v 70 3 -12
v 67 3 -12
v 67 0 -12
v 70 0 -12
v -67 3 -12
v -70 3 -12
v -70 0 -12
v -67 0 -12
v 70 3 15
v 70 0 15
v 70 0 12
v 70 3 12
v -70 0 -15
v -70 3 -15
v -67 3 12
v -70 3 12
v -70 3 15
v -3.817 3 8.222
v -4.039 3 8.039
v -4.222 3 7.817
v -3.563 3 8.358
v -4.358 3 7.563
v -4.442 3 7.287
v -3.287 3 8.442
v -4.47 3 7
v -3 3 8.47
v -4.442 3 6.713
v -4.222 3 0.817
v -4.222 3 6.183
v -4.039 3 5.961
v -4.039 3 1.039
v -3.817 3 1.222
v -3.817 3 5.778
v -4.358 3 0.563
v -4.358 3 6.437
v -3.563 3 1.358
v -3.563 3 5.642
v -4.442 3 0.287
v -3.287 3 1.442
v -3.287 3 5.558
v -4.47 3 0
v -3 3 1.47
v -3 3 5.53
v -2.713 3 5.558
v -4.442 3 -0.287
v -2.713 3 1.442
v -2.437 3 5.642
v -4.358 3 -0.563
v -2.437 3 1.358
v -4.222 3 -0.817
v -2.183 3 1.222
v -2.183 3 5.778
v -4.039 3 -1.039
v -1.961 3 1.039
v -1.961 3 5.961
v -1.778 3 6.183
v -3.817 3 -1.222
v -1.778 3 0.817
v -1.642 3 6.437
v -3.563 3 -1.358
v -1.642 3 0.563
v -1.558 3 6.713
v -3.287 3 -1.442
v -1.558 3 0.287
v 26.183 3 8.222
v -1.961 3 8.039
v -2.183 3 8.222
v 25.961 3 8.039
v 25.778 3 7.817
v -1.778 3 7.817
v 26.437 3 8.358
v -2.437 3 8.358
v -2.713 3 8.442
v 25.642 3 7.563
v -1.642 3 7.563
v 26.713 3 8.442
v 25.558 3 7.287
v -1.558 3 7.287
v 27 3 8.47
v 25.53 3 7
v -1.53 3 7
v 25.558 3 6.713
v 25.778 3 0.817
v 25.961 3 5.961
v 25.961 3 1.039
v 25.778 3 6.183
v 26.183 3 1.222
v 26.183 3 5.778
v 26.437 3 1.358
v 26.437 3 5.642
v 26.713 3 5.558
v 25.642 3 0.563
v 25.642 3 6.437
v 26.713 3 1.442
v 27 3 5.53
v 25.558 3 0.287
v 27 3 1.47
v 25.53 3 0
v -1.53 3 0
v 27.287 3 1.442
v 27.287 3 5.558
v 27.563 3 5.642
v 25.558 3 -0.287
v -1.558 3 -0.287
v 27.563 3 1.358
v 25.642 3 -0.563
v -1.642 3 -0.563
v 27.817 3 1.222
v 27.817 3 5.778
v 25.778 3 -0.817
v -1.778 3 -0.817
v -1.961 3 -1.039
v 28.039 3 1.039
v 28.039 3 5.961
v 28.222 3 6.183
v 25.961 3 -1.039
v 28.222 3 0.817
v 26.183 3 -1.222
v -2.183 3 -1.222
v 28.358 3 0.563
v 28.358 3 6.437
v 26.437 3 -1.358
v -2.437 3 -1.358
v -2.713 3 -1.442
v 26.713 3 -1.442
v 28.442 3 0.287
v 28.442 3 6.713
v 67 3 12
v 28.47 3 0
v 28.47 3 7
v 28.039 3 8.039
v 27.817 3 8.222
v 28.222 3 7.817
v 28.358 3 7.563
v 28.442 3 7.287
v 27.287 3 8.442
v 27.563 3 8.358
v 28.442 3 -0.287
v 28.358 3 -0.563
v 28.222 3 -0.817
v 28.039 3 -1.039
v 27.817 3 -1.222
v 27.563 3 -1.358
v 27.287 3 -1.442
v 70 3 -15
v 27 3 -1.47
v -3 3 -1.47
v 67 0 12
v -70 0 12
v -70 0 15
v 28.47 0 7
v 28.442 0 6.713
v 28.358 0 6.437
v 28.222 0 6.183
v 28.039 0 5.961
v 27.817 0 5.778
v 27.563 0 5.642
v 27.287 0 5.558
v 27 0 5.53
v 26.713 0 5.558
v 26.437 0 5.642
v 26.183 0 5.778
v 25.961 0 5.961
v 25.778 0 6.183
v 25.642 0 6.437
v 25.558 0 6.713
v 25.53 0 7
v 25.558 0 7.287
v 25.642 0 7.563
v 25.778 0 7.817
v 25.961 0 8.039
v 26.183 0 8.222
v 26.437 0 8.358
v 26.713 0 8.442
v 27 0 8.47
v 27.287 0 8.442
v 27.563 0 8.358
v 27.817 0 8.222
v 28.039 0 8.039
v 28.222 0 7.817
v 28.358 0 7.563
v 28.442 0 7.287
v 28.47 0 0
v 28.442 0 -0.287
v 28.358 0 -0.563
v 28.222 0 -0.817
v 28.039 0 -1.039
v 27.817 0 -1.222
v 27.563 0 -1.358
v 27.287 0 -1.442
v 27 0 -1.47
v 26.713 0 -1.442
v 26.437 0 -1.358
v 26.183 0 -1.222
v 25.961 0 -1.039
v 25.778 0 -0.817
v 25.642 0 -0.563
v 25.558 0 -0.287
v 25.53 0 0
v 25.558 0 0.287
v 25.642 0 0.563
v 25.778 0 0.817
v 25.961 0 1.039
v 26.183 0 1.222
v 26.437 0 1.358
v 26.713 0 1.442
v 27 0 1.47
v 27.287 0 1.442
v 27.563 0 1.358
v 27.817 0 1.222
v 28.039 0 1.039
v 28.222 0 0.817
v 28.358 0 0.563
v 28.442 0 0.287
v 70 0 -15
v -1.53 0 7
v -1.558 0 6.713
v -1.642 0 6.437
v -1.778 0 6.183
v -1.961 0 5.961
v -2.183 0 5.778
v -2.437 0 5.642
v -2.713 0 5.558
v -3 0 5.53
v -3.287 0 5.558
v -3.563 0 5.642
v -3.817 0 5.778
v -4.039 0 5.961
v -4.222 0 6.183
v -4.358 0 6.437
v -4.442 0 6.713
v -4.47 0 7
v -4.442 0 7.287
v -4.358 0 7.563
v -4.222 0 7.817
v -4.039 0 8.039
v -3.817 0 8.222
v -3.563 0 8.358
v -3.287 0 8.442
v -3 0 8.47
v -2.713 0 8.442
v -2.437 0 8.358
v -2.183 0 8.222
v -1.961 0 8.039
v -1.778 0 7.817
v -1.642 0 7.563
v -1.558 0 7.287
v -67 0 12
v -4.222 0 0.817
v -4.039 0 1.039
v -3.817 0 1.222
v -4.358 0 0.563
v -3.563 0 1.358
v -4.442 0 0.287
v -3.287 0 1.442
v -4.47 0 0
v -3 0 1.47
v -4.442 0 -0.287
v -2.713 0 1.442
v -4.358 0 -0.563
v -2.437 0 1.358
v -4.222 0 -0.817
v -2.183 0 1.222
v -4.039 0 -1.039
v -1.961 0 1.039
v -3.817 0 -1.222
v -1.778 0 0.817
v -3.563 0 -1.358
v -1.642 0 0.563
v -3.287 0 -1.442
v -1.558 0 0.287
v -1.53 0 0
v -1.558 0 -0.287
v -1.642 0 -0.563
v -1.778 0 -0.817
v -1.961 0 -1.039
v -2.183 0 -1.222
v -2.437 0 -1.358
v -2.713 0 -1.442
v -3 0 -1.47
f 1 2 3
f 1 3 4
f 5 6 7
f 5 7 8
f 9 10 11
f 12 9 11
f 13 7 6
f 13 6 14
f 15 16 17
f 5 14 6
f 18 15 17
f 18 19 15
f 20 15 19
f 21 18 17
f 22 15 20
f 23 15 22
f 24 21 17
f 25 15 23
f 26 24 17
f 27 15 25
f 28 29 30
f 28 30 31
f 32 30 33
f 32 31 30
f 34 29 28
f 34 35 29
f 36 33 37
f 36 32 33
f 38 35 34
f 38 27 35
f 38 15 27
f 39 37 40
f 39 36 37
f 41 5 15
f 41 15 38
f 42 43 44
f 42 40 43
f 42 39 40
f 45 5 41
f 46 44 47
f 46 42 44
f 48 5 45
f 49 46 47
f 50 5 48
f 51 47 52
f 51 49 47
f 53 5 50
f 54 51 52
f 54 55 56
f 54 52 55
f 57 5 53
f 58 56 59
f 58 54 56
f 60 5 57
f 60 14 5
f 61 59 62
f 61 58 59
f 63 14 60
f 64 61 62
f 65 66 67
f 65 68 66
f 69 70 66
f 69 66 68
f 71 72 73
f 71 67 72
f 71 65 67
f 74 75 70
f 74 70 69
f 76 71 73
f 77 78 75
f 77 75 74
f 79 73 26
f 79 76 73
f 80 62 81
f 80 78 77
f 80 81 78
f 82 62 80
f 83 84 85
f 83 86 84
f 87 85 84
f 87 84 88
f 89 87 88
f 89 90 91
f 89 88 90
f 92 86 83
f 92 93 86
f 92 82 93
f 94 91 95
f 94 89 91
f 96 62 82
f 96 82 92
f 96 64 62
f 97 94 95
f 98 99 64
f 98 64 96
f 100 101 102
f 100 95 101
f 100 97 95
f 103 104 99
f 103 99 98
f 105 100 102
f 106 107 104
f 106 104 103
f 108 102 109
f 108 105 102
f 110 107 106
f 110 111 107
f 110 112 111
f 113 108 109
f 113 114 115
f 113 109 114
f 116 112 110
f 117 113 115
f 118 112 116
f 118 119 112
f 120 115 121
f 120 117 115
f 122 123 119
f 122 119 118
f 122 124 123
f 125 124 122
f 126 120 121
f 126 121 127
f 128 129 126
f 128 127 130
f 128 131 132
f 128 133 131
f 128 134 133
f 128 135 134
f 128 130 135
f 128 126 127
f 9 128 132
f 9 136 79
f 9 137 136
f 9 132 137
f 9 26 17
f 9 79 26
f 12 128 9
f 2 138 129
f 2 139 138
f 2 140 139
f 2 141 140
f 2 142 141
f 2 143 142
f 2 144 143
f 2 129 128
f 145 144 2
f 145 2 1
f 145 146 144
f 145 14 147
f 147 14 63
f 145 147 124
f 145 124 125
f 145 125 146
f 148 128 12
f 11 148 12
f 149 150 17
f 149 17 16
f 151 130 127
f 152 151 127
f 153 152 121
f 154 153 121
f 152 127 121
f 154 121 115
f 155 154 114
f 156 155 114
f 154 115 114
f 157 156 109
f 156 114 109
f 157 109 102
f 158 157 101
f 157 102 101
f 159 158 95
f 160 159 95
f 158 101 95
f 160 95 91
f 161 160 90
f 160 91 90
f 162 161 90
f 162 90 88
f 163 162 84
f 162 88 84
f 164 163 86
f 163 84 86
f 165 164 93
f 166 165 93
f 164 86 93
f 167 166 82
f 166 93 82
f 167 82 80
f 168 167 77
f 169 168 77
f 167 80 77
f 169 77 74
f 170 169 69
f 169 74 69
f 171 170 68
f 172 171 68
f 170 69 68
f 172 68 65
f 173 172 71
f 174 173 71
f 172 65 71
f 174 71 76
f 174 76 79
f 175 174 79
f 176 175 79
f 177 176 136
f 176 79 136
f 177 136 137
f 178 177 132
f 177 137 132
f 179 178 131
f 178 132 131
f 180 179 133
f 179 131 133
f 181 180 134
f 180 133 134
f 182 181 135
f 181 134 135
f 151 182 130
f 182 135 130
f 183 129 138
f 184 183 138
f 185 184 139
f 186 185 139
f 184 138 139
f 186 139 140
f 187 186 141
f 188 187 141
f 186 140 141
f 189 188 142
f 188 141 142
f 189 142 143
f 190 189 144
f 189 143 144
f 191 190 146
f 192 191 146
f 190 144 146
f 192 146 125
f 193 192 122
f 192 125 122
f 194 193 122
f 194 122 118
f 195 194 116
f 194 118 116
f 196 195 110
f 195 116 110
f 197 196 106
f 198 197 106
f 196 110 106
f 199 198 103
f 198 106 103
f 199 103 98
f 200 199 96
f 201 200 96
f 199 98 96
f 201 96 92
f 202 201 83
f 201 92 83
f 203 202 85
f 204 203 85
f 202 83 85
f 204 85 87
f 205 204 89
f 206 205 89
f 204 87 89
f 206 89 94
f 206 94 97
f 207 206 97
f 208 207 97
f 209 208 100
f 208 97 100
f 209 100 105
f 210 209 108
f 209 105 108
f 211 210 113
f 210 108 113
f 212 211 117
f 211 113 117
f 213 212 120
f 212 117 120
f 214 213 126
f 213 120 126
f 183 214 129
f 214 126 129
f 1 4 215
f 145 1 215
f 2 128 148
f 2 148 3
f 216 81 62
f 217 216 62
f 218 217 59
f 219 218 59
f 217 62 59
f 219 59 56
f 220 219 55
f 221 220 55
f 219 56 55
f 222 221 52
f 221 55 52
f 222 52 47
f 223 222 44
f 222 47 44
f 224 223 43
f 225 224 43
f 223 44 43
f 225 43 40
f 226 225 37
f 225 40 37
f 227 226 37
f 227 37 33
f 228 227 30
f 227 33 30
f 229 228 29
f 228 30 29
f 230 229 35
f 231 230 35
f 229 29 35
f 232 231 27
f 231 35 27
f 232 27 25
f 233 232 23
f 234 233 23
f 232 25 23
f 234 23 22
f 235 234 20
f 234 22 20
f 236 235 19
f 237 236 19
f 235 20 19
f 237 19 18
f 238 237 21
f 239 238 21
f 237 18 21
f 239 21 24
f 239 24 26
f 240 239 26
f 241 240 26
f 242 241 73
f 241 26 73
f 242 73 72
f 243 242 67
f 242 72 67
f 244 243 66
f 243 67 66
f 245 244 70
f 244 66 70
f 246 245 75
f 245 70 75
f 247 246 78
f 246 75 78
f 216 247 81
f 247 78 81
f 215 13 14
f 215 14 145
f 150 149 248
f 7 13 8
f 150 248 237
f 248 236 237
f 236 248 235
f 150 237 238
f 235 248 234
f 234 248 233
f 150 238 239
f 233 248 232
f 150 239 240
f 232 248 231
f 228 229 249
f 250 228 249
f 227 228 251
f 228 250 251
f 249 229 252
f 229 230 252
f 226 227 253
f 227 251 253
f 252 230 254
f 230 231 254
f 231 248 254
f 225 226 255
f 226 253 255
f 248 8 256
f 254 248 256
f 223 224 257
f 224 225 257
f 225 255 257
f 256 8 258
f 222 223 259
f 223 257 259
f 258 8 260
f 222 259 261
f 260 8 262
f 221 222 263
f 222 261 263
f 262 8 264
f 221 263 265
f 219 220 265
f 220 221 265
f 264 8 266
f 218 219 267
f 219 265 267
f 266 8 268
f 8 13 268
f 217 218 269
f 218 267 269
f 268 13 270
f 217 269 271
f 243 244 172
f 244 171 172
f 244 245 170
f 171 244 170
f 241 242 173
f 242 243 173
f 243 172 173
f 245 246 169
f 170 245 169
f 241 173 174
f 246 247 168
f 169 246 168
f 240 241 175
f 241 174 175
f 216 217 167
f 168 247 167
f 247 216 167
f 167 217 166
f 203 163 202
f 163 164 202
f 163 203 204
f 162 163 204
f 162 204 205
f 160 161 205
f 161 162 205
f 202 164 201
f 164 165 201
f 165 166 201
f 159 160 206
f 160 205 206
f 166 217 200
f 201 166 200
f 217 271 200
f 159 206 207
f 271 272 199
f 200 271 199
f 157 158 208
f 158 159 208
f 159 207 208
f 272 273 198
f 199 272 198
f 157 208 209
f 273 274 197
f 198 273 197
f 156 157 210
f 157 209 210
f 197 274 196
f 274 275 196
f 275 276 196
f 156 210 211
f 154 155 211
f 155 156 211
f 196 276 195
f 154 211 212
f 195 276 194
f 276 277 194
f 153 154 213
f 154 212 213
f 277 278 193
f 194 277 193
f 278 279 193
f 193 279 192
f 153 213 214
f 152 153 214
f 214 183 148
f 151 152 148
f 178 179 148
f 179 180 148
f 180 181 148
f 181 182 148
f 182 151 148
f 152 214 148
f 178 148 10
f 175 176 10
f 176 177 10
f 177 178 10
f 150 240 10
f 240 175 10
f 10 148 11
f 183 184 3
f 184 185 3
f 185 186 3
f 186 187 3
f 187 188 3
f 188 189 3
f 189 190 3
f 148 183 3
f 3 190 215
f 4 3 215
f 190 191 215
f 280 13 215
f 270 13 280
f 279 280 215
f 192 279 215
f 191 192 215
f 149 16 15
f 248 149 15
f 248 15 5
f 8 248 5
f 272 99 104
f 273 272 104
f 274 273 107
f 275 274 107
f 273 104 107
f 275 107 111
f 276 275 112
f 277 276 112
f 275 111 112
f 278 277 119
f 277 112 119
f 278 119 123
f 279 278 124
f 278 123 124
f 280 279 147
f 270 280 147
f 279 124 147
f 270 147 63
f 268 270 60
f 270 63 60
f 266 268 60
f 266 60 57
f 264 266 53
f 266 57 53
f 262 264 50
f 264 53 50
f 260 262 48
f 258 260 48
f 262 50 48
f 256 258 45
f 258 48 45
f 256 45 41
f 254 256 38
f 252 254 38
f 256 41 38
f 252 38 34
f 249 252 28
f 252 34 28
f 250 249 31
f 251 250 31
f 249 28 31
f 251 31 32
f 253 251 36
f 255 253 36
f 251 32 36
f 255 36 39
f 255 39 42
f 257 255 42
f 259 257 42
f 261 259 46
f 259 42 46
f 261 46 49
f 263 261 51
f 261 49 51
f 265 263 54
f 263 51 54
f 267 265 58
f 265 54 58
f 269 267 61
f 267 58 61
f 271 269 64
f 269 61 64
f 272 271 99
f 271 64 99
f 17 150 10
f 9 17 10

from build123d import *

# Parameters (mm, degrees)
SKETCH1_W           = 140
SKETCH1_H           = 30
BOSS_EXTRUDE1_DEPTH = 3
SKETCH2_W           = 3
SKETCH2_H           = 24
CUT_EXTRUDE1_DEPTH  = 3
SKETCH3_R           = 1.47
CUT_EXTRUDE2_DEPTH  = 3


with BuildPart() as part:
    # Sketch1 → Boss-Extrude1 (new body)
    with BuildSketch(Plane(origin=(0, 0, 0), x_dir=(1, 0, 0), z_dir=(0, 1, 0))):
        Rectangle(SKETCH1_W, SKETCH1_H)
    extrude(amount=BOSS_EXTRUDE1_DEPTH)

    # Sketch2 → Cut-Extrude1 (cut)
    with BuildSketch(Plane(origin=(0, 3, 0), x_dir=(1, 0, 0), z_dir=(0, 1, 0))):
        with Locations((-68.5, 0)):
            Rectangle(SKETCH2_W, SKETCH2_H)
        with Locations((68.5, 0)):
            Rectangle(SKETCH2_W, SKETCH2_H)
    extrude(amount=-CUT_EXTRUDE1_DEPTH, mode=Mode.SUBTRACT)

    # Sketch3 → Cut-Extrude2 (cut)
    with BuildSketch(Plane(origin=(0, 3, 0), x_dir=(1, 0, 0), z_dir=(0, 1, 0))):
        with Locations((-3, 0)):
            Circle(SKETCH3_R)
        with Locations((-3, -7)):
            Circle(SKETCH3_R)
        with Locations((27, 0)):
            Circle(SKETCH3_R)
        with Locations((27, -7)):
            Circle(SKETCH3_R)
    extrude(amount=-CUT_EXTRUDE2_DEPTH, mode=Mode.SUBTRACT)


solid = part.part
